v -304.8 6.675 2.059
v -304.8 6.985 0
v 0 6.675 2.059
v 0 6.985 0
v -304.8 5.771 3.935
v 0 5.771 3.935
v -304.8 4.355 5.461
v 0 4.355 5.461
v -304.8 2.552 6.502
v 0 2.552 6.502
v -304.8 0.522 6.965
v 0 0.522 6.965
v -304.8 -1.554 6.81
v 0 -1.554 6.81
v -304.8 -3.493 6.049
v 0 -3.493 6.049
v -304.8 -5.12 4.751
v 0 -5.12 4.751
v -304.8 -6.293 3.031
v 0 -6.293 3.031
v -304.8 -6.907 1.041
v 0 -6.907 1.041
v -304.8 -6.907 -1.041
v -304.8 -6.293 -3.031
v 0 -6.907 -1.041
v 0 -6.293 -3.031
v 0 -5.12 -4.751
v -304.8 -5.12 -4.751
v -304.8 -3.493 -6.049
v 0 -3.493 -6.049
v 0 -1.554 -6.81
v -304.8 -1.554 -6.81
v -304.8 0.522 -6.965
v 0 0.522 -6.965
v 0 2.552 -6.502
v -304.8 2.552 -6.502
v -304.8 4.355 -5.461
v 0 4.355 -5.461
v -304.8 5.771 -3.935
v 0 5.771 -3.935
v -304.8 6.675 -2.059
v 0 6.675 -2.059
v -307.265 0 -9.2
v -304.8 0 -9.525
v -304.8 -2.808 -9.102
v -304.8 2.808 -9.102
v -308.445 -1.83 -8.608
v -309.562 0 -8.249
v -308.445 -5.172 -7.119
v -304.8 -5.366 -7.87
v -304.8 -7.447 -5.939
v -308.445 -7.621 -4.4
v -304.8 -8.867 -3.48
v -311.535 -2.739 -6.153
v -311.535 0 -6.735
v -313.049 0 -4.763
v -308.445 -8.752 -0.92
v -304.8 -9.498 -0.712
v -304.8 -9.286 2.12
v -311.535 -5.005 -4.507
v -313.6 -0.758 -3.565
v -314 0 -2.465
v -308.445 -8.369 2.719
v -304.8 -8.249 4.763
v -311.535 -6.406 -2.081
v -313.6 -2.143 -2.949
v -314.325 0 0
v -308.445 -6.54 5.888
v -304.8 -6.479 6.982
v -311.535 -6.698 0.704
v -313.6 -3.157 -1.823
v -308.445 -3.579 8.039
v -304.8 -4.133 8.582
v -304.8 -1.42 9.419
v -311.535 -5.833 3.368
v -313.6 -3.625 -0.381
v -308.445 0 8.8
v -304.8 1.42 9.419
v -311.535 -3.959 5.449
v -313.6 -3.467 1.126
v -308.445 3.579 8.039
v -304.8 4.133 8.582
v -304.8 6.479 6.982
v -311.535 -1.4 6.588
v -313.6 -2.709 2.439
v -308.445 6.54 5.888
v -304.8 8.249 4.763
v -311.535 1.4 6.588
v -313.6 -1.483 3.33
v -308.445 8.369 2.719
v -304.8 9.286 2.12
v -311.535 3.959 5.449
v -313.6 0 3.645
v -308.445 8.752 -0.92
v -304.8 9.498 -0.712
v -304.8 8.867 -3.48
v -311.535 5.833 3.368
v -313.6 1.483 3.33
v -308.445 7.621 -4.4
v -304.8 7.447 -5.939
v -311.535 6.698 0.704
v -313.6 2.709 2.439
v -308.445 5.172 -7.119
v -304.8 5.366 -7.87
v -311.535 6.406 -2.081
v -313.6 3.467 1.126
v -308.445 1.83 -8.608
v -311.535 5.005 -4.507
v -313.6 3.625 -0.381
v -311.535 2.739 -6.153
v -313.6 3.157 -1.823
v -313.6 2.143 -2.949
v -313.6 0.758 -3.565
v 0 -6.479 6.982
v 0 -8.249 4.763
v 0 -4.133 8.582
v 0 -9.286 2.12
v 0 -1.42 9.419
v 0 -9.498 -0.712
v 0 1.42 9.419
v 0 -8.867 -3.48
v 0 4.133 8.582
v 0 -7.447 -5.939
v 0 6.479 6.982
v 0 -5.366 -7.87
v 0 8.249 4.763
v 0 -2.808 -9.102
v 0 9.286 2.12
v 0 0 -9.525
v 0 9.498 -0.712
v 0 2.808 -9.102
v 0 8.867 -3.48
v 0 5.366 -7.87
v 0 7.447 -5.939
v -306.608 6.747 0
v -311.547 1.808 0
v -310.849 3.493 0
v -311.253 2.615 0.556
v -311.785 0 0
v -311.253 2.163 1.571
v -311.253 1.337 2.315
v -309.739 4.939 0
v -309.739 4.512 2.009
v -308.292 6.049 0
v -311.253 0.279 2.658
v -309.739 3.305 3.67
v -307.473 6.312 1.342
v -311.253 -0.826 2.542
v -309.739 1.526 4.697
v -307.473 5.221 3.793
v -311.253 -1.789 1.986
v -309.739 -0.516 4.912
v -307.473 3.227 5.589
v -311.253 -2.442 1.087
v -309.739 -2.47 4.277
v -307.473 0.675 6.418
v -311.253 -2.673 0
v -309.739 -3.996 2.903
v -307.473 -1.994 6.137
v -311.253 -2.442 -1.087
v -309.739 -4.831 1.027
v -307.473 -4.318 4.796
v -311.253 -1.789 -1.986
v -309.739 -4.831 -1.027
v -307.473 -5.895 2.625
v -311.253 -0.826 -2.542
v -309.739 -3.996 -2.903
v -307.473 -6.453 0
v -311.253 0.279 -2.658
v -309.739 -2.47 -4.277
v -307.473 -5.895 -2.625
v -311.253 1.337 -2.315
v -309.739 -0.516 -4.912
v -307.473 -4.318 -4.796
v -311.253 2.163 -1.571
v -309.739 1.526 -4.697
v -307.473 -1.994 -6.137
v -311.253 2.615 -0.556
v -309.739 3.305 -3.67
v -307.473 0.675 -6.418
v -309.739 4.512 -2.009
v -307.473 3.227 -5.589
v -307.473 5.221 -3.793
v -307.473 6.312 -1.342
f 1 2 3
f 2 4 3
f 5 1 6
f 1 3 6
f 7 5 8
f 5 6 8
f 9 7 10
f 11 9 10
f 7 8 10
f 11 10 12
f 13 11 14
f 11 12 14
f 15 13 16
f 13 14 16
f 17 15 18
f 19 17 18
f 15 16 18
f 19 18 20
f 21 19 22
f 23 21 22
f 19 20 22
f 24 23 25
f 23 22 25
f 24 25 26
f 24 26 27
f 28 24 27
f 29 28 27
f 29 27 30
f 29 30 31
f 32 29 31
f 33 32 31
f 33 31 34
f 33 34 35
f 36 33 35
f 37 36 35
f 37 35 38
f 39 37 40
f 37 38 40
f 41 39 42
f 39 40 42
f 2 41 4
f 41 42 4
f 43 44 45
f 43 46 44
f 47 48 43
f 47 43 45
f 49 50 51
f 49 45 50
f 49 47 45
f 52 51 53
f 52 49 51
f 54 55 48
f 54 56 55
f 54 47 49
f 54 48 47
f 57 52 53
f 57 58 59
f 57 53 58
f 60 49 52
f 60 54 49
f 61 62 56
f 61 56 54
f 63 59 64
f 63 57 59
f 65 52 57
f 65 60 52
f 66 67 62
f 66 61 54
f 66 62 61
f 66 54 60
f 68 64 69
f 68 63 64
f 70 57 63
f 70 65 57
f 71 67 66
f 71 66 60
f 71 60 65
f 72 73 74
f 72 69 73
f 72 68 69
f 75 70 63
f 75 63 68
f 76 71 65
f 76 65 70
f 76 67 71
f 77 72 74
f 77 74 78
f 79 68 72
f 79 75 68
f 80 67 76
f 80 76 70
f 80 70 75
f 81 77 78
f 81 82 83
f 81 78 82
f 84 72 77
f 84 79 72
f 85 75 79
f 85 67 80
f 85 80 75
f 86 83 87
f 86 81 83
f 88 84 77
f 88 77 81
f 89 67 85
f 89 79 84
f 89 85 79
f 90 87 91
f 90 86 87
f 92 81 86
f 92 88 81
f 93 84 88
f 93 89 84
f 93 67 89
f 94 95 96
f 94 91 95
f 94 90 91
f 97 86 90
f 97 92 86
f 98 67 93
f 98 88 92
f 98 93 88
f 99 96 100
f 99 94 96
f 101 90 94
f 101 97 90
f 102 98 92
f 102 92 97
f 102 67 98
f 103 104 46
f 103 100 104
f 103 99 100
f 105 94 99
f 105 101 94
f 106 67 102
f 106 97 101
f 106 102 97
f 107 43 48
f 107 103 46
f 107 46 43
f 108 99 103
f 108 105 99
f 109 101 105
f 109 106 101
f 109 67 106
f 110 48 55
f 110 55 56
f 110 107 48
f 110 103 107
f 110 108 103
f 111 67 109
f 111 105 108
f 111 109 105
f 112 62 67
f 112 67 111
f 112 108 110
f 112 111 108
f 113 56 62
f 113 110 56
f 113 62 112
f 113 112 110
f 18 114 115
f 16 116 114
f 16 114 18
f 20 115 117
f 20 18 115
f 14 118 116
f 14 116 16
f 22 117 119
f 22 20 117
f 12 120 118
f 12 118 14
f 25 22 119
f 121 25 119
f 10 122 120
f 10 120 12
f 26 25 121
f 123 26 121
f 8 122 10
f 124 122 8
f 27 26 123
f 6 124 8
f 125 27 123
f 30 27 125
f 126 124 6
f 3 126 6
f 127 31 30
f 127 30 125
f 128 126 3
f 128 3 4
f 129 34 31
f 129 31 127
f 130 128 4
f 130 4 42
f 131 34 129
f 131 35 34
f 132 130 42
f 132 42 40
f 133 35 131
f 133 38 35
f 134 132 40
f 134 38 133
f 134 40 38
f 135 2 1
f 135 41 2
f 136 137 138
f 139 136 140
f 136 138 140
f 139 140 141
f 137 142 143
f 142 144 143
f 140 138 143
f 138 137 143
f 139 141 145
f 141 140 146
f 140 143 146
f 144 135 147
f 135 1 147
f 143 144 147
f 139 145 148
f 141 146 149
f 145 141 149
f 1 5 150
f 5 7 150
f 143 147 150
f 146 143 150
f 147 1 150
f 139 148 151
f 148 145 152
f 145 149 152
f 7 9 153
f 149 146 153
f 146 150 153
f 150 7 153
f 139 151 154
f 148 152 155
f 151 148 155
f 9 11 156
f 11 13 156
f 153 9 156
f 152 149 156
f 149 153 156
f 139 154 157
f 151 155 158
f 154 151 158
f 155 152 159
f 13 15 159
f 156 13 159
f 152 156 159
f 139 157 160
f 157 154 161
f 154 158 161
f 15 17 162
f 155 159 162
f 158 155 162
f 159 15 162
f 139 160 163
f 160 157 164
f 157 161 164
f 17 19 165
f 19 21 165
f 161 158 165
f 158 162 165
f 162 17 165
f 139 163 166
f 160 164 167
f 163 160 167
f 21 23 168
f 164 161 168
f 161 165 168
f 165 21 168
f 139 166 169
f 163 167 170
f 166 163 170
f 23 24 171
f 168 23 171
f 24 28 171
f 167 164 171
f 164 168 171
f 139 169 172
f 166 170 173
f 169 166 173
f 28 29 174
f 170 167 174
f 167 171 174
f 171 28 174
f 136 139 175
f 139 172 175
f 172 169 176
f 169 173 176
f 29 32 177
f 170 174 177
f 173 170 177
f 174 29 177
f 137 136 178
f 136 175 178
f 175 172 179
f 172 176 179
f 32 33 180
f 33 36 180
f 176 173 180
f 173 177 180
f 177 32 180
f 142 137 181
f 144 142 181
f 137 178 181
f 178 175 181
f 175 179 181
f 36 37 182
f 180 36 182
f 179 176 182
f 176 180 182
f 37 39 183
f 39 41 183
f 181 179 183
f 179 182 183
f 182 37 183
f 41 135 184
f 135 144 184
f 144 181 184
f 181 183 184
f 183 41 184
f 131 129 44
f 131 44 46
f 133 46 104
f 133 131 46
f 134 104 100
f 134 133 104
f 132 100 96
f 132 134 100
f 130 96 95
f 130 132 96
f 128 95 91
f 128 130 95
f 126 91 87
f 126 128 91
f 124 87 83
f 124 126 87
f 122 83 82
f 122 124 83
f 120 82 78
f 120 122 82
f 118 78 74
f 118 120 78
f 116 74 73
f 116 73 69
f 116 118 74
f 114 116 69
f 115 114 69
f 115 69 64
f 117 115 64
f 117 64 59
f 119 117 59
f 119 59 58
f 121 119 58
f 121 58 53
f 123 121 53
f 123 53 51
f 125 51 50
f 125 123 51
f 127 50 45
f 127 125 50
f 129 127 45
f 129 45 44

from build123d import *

# Parameters (mm, degrees)
SKETCH1_R           = 9.525
BOSS_EXTRUDE1_DEPTH = 304.8
DOME1_FACE_RADIUS   = 9.525
DOME1_HEIGHT        = 9.525


# Read off the part's stored shape, not the designer's step: Shell1
with BuildPart() as part:
    # Sketch1 → Boss-Extrude1 (new body)
    with BuildSketch(Plane(origin=(0, 0, 0), x_dir=(0, 0, -1), z_dir=(1, 0, 0))):
        Circle(SKETCH1_R)
    extrude(amount=-BOSS_EXTRUDE1_DEPTH)

    # Dome1: a dome of height H over a round flat face of radius A is a cap of a sphere of radius (A * A + H * H) / (2 * H)
    dome1_r = (DOME1_FACE_RADIUS * DOME1_FACE_RADIUS + DOME1_HEIGHT * DOME1_HEIGHT) / (2 * DOME1_HEIGHT)
    dome1_base = Plane((-304.8, 0, 0), z_dir=(-1, 0, 0))
    with Locations(dome1_base.offset(DOME1_HEIGHT - dome1_r)):
        dome1_ball = Sphere(dome1_r, mode=Mode.PRIVATE)
    add(split(dome1_ball, bisect_by=dome1_base, keep=Keep.TOP, mode=Mode.PRIVATE))

    # Shell1 outline → Shell1 (revolve, cut)
    with BuildSketch(Plane.YX):
        with BuildLine():
            ThreePointArc((0, -311.785), (4.939140869, -309.739140864), (6.985, -304.799999993))
            Line((6.985, -304.799999993), (6.985, 0))
            Line((6.985, 0), (0, 0))
            Line((0, 0), (0, -311.785))
        make_face()
    revolve(axis=Axis((0, 0, 0), (1, 0, 0)), mode=Mode.SUBTRACT)


solid = part.part
